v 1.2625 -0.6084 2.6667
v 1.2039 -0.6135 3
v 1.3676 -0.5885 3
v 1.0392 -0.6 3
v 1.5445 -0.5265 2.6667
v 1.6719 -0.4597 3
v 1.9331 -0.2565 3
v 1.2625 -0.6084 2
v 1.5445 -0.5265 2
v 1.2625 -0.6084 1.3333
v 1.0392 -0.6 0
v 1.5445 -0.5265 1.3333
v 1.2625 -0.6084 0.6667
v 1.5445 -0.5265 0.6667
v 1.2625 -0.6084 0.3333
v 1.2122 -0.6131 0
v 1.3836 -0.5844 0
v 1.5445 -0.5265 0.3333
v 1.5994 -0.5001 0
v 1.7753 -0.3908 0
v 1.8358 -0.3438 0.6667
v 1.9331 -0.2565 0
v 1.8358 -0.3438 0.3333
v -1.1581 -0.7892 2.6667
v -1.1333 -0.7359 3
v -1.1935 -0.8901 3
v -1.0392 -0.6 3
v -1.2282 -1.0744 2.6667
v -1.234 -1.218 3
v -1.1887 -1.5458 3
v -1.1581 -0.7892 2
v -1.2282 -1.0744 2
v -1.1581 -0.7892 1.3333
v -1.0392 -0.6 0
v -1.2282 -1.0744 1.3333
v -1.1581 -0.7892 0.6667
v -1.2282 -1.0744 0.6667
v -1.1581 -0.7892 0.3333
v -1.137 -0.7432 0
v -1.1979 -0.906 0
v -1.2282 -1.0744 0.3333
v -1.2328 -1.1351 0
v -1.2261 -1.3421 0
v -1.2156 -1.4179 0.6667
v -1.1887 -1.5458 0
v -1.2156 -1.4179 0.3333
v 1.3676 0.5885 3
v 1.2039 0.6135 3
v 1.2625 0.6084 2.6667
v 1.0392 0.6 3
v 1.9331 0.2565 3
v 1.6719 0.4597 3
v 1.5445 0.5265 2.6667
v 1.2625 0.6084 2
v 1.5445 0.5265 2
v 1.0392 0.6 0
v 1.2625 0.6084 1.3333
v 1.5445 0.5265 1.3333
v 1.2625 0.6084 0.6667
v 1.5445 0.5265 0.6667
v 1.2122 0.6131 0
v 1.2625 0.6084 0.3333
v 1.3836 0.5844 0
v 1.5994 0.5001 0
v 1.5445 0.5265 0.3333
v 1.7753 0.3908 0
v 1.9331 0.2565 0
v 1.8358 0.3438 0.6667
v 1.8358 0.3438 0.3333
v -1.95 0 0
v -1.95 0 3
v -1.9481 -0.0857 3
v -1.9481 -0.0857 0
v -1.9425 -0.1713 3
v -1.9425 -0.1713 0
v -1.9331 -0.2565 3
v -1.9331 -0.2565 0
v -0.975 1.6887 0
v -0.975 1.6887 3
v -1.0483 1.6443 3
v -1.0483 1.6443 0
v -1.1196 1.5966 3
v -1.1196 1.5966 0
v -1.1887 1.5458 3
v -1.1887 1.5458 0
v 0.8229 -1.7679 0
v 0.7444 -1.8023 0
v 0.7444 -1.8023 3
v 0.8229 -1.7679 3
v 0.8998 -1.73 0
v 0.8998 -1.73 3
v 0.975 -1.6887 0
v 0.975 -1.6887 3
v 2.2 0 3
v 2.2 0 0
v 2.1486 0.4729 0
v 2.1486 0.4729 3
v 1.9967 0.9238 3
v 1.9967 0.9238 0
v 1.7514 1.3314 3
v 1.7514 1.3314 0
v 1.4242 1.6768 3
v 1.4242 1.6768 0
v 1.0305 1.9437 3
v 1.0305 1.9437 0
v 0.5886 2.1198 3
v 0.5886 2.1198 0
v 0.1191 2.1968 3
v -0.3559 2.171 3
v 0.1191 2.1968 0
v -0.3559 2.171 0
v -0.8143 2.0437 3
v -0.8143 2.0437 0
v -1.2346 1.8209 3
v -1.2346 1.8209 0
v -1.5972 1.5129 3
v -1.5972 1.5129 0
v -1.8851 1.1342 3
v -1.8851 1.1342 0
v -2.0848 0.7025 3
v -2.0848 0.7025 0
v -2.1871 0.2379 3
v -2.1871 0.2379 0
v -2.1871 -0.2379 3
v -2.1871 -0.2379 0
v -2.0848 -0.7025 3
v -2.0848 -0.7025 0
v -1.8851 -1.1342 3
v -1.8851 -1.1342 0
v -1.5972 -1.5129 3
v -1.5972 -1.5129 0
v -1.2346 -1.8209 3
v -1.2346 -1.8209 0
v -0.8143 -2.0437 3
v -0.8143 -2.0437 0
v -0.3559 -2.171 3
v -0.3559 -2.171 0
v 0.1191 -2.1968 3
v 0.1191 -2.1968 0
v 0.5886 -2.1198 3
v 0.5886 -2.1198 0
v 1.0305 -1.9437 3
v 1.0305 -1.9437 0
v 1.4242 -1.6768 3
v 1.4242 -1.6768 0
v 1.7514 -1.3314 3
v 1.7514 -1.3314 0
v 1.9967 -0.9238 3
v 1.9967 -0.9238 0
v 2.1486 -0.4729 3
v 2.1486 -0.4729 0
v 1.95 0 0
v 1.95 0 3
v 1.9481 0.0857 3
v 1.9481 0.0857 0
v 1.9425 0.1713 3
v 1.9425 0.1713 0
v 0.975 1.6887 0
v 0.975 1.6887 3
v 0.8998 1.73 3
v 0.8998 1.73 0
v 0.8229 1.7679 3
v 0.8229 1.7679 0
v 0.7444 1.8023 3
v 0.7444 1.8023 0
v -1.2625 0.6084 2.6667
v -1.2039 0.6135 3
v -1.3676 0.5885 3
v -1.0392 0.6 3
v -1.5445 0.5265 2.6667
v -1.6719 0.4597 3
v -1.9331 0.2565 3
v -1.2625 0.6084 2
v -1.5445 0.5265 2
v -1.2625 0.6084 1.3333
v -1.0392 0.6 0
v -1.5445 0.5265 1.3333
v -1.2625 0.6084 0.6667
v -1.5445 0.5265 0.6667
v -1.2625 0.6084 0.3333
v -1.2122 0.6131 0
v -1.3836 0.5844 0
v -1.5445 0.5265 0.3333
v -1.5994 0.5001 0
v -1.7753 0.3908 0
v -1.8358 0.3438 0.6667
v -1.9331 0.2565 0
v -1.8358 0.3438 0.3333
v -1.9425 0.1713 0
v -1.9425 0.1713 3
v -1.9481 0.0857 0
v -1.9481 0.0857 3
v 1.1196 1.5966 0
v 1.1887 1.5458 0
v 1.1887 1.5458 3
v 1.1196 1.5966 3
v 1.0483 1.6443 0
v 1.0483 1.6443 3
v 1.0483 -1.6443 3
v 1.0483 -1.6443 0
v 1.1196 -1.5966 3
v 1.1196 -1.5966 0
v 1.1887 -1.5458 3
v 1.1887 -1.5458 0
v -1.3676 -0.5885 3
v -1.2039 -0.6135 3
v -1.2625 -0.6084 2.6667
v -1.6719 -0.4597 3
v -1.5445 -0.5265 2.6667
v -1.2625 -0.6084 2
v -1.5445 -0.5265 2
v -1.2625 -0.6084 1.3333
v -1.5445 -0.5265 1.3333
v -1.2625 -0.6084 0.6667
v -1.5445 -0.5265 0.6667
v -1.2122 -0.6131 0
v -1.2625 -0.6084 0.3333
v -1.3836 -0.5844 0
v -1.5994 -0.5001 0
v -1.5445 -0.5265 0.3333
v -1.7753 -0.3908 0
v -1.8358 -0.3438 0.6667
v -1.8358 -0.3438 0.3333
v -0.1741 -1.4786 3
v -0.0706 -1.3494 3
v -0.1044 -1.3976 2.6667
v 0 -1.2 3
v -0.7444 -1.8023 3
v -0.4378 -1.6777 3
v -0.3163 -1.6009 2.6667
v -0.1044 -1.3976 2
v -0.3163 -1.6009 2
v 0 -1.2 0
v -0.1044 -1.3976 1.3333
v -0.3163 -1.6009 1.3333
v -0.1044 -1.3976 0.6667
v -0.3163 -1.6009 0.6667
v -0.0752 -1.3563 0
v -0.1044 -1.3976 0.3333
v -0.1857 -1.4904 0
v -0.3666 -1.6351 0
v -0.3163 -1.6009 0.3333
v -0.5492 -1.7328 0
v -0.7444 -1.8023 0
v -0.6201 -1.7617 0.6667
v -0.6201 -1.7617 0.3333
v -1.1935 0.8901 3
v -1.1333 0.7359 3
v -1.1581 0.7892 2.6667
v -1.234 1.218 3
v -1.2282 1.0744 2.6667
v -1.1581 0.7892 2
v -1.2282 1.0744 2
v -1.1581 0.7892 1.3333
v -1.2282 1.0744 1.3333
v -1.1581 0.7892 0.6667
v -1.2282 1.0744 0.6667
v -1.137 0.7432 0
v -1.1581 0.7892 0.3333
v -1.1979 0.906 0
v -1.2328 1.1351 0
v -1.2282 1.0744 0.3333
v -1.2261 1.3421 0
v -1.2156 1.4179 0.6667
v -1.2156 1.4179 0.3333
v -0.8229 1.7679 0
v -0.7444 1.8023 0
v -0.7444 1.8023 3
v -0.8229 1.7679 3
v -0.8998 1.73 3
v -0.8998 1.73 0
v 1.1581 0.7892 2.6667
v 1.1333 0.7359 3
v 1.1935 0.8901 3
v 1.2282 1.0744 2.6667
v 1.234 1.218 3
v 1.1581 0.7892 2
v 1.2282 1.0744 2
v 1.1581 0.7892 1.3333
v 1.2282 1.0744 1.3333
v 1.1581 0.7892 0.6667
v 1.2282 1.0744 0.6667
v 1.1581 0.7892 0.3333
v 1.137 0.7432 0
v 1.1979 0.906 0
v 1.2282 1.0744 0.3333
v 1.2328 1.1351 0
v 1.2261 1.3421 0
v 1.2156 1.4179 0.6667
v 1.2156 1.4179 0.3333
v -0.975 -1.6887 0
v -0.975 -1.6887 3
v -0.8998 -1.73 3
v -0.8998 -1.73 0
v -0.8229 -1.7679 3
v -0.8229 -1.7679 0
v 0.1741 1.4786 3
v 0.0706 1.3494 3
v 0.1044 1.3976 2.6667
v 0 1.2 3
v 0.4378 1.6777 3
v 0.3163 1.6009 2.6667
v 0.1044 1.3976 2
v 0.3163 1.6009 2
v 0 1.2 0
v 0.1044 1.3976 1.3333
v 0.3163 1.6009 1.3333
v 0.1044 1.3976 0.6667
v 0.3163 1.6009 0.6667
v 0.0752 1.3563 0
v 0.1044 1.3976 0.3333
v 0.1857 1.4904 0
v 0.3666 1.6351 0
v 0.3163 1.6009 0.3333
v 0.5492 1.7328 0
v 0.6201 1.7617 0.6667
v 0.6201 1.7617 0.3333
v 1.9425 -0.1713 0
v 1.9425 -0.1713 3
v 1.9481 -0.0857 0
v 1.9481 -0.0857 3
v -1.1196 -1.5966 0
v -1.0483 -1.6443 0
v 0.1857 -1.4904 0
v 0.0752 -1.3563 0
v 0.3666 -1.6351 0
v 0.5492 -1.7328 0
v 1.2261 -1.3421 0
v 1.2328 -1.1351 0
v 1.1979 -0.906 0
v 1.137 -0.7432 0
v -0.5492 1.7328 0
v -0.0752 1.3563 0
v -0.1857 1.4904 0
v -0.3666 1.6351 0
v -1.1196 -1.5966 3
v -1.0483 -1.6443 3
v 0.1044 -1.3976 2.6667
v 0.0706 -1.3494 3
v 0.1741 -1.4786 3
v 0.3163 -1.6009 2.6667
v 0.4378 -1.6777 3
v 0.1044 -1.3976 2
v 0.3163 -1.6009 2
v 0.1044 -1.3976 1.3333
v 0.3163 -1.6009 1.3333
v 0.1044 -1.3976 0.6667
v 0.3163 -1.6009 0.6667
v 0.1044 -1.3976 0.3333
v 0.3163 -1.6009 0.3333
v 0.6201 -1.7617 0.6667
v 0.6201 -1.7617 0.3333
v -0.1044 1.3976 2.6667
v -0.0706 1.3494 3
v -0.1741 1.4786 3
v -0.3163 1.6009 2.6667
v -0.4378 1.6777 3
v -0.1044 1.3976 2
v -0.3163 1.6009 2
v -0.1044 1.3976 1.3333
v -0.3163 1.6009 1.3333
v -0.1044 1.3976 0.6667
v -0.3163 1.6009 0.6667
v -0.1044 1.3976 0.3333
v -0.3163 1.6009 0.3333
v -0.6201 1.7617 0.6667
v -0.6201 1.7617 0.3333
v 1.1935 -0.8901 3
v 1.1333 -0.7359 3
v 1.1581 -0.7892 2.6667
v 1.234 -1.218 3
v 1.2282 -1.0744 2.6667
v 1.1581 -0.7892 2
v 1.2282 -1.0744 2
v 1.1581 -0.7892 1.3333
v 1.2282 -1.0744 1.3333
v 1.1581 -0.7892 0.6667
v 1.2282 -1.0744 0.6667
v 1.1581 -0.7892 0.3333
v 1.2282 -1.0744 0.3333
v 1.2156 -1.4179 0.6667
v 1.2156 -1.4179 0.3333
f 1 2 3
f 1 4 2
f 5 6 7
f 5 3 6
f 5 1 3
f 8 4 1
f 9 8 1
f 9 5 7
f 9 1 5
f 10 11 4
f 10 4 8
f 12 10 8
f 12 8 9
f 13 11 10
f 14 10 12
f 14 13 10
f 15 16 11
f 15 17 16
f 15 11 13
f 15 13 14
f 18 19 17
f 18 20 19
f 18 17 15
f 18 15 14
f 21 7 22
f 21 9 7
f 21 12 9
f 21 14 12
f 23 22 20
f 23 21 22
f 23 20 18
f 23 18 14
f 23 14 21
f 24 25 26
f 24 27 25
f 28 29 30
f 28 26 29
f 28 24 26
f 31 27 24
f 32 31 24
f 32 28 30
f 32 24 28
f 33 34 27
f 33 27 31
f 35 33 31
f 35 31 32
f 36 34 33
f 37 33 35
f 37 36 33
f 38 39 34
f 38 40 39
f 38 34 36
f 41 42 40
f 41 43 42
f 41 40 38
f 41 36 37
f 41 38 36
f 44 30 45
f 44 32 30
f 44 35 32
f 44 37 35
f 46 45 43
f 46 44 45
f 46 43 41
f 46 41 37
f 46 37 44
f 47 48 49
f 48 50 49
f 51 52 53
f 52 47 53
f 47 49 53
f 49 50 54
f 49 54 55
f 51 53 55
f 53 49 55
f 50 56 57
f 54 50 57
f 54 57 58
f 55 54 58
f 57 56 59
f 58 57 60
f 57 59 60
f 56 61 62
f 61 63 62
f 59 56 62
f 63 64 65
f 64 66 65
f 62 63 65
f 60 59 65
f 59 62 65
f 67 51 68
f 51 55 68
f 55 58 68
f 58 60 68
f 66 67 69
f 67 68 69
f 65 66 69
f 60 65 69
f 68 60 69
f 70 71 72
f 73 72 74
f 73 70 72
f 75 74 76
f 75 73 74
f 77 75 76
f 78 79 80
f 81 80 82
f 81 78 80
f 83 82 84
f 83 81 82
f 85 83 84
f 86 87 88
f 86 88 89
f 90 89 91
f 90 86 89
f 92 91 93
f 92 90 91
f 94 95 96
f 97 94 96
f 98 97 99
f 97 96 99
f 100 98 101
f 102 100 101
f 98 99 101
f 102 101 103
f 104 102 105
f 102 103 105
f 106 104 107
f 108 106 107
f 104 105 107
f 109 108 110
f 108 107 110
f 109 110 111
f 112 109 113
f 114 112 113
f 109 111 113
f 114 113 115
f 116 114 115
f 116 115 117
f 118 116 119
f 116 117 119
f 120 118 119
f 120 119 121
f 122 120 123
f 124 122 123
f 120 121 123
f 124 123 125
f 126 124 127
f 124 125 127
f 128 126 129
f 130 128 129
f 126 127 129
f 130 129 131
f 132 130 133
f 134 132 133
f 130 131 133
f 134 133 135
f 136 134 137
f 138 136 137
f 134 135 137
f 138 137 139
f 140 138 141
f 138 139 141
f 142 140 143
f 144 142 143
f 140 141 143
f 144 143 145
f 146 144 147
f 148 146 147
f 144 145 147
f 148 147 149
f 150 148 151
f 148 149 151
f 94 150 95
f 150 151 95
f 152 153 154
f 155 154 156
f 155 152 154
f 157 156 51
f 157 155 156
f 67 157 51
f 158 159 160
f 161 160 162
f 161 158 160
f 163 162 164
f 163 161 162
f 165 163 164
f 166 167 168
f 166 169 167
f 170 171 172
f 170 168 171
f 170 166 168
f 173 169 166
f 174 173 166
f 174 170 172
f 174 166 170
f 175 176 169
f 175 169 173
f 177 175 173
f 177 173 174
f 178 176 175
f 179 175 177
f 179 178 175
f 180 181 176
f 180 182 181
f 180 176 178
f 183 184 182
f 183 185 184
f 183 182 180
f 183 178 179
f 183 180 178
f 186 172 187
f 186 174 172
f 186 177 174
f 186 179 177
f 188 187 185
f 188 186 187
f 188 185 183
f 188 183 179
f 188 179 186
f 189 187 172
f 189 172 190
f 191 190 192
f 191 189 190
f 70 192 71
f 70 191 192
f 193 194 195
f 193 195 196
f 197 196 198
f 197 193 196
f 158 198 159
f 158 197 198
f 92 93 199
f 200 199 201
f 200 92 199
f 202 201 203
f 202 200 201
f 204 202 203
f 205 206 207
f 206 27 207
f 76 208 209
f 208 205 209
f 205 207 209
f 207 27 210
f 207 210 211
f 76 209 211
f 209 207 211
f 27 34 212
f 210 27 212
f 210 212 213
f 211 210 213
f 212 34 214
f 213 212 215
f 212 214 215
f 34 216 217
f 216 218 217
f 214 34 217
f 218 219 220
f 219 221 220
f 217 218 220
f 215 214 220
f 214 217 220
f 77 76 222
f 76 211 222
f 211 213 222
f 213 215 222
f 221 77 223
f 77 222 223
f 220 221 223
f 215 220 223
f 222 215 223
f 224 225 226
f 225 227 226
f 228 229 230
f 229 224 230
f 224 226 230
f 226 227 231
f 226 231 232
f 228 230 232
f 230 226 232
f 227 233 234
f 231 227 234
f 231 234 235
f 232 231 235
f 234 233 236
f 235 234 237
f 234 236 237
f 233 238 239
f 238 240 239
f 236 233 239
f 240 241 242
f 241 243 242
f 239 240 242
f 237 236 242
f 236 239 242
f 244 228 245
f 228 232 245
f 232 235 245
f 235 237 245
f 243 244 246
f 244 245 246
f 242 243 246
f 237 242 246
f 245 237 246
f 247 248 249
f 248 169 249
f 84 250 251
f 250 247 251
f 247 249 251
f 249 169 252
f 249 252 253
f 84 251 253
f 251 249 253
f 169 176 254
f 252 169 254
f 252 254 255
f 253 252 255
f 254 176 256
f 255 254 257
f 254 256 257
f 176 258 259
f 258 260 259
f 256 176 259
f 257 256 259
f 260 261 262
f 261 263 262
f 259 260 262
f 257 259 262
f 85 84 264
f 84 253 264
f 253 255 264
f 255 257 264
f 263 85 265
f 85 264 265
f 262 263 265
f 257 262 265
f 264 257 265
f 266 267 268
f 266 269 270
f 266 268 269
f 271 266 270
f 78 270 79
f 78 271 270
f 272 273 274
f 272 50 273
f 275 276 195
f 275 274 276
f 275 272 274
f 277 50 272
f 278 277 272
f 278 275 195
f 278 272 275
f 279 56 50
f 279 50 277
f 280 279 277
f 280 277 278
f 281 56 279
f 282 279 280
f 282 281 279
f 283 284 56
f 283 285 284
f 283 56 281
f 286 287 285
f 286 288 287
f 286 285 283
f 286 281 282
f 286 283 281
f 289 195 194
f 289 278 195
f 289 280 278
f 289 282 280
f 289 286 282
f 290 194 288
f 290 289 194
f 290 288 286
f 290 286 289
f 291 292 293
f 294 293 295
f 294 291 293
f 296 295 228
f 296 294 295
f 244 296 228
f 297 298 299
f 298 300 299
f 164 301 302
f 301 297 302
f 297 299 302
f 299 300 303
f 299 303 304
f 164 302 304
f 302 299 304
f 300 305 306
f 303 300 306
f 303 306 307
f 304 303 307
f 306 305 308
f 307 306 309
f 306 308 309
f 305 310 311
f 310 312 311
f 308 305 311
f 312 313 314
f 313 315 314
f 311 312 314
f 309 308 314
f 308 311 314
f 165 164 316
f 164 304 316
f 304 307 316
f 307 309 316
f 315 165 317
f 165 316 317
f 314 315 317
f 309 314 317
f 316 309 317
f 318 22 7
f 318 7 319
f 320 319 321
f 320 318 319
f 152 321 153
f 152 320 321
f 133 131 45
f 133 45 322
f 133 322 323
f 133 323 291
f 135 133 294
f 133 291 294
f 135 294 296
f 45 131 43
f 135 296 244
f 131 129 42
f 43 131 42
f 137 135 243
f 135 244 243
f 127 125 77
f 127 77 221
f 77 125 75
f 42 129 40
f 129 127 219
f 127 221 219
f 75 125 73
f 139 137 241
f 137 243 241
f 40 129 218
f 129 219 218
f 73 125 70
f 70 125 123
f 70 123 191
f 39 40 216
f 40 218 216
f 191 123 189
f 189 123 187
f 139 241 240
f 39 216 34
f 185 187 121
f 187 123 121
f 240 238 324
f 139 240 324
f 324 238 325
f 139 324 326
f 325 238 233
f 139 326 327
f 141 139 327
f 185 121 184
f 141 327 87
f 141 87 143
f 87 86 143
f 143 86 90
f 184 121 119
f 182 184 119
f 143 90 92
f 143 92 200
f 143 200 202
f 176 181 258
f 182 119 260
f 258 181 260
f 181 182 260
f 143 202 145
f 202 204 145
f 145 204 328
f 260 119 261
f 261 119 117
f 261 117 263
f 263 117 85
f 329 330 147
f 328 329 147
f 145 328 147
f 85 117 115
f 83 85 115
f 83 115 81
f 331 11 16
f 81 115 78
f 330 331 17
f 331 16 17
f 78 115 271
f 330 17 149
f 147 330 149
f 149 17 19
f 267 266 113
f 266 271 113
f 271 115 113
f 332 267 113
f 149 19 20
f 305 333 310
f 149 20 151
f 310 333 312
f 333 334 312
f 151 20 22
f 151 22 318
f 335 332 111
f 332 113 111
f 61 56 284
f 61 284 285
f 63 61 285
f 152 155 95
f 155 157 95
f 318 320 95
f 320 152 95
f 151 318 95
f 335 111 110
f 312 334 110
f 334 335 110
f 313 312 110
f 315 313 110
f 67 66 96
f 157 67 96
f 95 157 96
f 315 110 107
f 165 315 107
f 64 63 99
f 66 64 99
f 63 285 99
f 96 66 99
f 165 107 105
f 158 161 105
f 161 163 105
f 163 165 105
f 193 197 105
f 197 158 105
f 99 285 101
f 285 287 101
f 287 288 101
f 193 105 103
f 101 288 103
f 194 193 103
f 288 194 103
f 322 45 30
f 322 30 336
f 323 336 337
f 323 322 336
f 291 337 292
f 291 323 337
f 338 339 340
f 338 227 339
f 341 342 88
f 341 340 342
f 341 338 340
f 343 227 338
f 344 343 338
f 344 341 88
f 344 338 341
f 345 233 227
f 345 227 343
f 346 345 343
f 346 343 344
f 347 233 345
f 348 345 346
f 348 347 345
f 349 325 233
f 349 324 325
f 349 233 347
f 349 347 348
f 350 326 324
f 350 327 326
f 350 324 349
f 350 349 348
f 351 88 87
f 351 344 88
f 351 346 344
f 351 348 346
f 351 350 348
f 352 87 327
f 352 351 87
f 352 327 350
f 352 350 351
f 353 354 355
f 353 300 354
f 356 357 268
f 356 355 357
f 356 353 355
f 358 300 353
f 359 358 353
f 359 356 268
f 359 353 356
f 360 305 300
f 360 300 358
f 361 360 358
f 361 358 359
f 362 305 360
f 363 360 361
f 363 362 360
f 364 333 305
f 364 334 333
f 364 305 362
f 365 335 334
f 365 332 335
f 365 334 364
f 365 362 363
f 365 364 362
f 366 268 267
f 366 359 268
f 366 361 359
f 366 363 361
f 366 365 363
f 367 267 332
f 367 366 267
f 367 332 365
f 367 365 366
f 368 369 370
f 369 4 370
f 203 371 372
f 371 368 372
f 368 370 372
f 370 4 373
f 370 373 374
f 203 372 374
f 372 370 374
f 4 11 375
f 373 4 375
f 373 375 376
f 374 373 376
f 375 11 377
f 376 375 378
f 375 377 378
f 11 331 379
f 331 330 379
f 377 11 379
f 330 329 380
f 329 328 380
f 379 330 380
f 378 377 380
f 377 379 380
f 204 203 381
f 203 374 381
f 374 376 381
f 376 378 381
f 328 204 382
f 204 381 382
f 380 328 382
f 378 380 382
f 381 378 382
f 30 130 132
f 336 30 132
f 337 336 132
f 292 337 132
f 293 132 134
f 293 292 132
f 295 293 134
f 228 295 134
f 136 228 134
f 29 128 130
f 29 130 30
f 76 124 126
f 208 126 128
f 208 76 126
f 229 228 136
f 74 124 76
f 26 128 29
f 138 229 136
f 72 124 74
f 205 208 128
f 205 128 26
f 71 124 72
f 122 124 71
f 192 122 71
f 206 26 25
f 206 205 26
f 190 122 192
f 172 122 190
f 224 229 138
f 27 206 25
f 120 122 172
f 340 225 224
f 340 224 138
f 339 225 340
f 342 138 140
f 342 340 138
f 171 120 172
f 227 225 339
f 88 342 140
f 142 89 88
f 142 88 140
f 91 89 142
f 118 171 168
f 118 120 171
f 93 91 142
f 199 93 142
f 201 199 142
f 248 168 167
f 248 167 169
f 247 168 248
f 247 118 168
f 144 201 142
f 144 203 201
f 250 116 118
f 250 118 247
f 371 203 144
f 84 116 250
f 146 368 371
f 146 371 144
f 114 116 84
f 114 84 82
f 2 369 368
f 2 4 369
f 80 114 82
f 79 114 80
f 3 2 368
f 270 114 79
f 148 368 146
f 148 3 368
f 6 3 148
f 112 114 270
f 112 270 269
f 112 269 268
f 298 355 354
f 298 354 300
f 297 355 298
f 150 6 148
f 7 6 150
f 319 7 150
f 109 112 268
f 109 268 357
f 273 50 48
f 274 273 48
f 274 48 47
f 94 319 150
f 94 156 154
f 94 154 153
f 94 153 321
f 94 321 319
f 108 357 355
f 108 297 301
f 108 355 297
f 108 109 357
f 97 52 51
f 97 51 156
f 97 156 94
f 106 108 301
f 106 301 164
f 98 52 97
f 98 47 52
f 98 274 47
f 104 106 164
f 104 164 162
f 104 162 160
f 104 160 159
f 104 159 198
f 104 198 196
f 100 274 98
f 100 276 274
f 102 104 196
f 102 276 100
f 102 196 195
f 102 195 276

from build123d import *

# Parameters (mm, degrees)
SKETCH_1_R               = 2.2
SKETCH_1_R_2             = 1.05
EXTRUDE_1_DEPTH          = 3
CUT_EXTRUDE_2_DEPTH      = 5.322036557
PATTERN_CIRCULAR_1_COUNT = 6


with BuildPart() as part:
    # 草图1 → 凸台-拉伸1 (new body)
    with BuildSketch(Plane.XY):
        Circle(SKETCH_1_R)
        Circle(SKETCH_1_R_2, mode=Mode.SUBTRACT)
    extrude(amount=EXTRUDE_1_DEPTH)

    # 草图1<3> → 切除-拉伸2 (cut, through all)
    with BuildSketch(Plane.XY):
        with BuildLine():
            Line((0.97057531, 0.574051885), (0.903756587, 0.534531599))
            ThreePointArc((0.903756587, 0.534531599), (1.012779447, 0.277088058), (1.05, 0))
            ThreePointArc((1.05, 0), (1.012779447, -0.277088058), (0.903756587, -0.534531599))
            Line((0.903756587, -0.534531599), (0.97057531, -0.574051885))
            add(Edge.make_bspline(
                [(0.97057531, -0.574051885), (0.977973742, -0.578427727), (0.999529885, -0.589101664), (1.043549257, -0.602890479), (1.117277172, -0.615236154), (1.21432505, -0.616206808), (1.33781215, -0.599805412), (1.478114557, -0.559025913), (1.624165195, -0.492647236), (1.761345474, -0.4056243), (1.854017664, -0.330826946), (1.909685478, -0.279355742), (1.933057183, -0.256495473)],
                knots=[0, 0, 0, 0, 0, 0.005604068, 0.015718248, 0.029959916, 0.048733667, 0.068727063, 0.096888892, 0.125050566, 0.153212235, 0.174576438, 0.174576438, 0.174576438, 0.174576438, 0.174576438], degree=4))
            ThreePointArc((1.933057183, -0.256495473), (1.945759685, -0.128527221), (1.95, 0))
            ThreePointArc((1.95, 0), (1.945759685, 0.128527221), (1.933057183, 0.256495473))
            add(Edge.make_bspline(
                [(0.97057531, 0.574051885), (0.977973742, 0.578427727), (0.999529885, 0.589101664), (1.043549257, 0.602890479), (1.117277172, 0.615236154), (1.21432505, 0.616206808), (1.33781215, 0.599805412), (1.478114557, 0.559025913), (1.624165195, 0.492647236), (1.761345474, 0.4056243), (1.854017664, 0.330826946), (1.909685478, 0.279355742), (1.933057183, 0.256495473)],
                knots=[0, 0, 0, 0, 0, 0.005604068, 0.015718248, 0.029959916, 0.048733667, 0.068727063, 0.096888892, 0.125050566, 0.153212235, 0.174576438, 0.174576438, 0.174576438, 0.174576438, 0.174576438], degree=4))
        make_face()
    cut_extrude_2 = extrude(amount=CUT_EXTRUDE_2_DEPTH, mode=Mode.SUBTRACT)

    # 阵列(圆周)1: 切除-拉伸2 ×6 about axis
    pattern_circular_1_axis = Axis((0, 0, 3), (0, 0, 1))
    for i in range(1, PATTERN_CIRCULAR_1_COUNT):
        add(cut_extrude_2.rotate(pattern_circular_1_axis, i * 360 / PATTERN_CIRCULAR_1_COUNT), mode=Mode.SUBTRACT)


solid = part.part
